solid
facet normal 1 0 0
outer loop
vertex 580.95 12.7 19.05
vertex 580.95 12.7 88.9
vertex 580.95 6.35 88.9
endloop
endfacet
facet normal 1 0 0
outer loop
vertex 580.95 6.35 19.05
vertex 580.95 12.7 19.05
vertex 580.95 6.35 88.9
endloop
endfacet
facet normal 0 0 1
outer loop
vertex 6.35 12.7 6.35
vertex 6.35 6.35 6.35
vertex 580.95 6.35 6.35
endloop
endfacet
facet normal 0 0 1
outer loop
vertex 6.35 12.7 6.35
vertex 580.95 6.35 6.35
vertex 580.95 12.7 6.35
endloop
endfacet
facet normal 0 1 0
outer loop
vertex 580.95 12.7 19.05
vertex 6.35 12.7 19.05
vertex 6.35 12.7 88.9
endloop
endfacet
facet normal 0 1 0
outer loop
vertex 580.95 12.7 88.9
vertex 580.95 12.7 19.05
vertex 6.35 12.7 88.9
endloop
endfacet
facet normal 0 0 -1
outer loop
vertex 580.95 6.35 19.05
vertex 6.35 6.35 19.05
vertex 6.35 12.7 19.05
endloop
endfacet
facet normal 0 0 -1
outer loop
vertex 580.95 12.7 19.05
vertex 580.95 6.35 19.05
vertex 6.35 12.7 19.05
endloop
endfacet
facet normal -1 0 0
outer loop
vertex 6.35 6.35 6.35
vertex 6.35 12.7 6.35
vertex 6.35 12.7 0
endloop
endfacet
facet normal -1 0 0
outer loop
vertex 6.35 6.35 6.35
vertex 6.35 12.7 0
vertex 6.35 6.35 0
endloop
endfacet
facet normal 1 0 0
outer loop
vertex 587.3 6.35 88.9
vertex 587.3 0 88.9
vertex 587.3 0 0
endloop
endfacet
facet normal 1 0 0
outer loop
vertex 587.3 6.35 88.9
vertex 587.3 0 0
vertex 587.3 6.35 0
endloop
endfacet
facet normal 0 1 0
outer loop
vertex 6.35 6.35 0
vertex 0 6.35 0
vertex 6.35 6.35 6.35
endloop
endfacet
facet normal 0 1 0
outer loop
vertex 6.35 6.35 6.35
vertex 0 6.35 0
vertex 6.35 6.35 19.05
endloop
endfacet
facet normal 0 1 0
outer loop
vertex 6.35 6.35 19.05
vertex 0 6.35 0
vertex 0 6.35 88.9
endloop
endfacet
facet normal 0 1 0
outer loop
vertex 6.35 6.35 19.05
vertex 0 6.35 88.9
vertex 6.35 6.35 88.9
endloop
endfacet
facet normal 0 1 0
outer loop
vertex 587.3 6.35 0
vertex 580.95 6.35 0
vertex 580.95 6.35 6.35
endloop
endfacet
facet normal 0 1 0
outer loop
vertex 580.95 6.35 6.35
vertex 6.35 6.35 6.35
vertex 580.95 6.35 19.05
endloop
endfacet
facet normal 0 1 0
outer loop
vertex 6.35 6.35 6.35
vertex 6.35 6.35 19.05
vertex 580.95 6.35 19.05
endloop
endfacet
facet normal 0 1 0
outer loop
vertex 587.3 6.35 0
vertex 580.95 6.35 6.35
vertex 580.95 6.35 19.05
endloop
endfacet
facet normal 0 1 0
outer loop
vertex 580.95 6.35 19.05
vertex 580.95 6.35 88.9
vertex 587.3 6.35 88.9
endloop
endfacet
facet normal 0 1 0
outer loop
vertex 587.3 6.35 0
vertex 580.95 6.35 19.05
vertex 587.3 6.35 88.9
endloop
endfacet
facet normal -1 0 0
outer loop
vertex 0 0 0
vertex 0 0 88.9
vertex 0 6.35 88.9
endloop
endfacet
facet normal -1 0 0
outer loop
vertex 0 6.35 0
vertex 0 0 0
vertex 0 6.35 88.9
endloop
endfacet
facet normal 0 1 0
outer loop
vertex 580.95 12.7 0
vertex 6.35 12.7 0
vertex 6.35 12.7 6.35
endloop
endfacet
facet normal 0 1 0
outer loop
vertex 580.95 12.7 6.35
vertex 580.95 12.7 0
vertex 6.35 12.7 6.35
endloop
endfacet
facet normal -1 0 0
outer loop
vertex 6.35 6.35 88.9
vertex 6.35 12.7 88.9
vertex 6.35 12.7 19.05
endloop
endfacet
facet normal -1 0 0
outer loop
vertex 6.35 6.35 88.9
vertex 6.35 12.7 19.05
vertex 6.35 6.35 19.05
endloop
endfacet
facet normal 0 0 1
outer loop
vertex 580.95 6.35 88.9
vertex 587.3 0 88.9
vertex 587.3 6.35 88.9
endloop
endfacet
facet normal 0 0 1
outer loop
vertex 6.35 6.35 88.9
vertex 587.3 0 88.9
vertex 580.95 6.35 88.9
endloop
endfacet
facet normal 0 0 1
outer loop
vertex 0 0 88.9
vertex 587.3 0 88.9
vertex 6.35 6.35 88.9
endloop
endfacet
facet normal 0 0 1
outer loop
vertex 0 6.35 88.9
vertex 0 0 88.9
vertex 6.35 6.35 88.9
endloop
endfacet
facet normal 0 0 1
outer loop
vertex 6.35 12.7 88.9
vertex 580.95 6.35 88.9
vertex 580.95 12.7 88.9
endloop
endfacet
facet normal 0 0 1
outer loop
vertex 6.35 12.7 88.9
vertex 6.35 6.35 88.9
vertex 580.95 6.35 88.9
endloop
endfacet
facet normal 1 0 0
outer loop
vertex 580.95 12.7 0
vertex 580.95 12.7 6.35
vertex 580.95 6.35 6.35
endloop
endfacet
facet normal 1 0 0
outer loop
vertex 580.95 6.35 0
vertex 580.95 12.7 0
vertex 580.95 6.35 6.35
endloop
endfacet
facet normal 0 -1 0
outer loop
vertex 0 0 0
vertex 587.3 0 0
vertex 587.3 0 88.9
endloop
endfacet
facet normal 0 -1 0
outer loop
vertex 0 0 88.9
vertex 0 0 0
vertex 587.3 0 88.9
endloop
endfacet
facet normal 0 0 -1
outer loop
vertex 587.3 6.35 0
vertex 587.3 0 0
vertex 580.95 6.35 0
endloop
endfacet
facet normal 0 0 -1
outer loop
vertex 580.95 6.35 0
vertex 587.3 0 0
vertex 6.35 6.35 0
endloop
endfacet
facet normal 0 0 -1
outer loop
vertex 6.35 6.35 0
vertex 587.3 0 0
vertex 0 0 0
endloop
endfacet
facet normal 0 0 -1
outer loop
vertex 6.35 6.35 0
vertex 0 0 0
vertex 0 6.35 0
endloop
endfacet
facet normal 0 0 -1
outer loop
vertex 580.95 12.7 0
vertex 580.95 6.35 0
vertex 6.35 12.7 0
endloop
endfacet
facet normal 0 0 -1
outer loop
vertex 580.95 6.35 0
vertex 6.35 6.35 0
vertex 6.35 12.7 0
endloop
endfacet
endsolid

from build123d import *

# Parameters (mm, degrees)
SKETCH_W        = 12.7
SKETCH_H        = 88.9
PAD_DEPTH       = 587.3
SKETCH001_W     = 6.35
SKETCH001_H     = 12.7
POCKET_DEPTH    = 587.301
SKETCH002_W     = 6.35
SKETCH002_H     = 6.35
POCKET001_DEPTH = 88.901


with BuildPart() as part:
    # Sketch → Pad (new body)
    with BuildSketch(Plane.YZ):
        with Locations((6.35, 44.45)):
            Rectangle(SKETCH_W, SKETCH_H)
    extrude(amount=PAD_DEPTH)

    # Sketch001 (on Face6 of Pad) → Pocket (cut, through all)
    with BuildSketch(Plane.YZ.offset(587.3)):
        with Locations((9.525, 12.7)):
            Rectangle(SKETCH001_W, SKETCH001_H)
    extrude(amount=-POCKET_DEPTH, mode=Mode.SUBTRACT)

    # Sketch002 (on Face6 of Pocket) → Pocket001 (cut, through all)
    with BuildSketch(Plane(origin=(0, 0, 88.9), x_dir=(0, -1, 0), z_dir=(0, 0, 1))):
        with Locations((-9.525, 584.125)):
            Rectangle(SKETCH002_W, SKETCH002_H)
        with Locations((-9.525, 3.175)):
            Rectangle(SKETCH002_W, SKETCH002_H)
    extrude(amount=-POCKET001_DEPTH, mode=Mode.SUBTRACT)


solid = part.part
